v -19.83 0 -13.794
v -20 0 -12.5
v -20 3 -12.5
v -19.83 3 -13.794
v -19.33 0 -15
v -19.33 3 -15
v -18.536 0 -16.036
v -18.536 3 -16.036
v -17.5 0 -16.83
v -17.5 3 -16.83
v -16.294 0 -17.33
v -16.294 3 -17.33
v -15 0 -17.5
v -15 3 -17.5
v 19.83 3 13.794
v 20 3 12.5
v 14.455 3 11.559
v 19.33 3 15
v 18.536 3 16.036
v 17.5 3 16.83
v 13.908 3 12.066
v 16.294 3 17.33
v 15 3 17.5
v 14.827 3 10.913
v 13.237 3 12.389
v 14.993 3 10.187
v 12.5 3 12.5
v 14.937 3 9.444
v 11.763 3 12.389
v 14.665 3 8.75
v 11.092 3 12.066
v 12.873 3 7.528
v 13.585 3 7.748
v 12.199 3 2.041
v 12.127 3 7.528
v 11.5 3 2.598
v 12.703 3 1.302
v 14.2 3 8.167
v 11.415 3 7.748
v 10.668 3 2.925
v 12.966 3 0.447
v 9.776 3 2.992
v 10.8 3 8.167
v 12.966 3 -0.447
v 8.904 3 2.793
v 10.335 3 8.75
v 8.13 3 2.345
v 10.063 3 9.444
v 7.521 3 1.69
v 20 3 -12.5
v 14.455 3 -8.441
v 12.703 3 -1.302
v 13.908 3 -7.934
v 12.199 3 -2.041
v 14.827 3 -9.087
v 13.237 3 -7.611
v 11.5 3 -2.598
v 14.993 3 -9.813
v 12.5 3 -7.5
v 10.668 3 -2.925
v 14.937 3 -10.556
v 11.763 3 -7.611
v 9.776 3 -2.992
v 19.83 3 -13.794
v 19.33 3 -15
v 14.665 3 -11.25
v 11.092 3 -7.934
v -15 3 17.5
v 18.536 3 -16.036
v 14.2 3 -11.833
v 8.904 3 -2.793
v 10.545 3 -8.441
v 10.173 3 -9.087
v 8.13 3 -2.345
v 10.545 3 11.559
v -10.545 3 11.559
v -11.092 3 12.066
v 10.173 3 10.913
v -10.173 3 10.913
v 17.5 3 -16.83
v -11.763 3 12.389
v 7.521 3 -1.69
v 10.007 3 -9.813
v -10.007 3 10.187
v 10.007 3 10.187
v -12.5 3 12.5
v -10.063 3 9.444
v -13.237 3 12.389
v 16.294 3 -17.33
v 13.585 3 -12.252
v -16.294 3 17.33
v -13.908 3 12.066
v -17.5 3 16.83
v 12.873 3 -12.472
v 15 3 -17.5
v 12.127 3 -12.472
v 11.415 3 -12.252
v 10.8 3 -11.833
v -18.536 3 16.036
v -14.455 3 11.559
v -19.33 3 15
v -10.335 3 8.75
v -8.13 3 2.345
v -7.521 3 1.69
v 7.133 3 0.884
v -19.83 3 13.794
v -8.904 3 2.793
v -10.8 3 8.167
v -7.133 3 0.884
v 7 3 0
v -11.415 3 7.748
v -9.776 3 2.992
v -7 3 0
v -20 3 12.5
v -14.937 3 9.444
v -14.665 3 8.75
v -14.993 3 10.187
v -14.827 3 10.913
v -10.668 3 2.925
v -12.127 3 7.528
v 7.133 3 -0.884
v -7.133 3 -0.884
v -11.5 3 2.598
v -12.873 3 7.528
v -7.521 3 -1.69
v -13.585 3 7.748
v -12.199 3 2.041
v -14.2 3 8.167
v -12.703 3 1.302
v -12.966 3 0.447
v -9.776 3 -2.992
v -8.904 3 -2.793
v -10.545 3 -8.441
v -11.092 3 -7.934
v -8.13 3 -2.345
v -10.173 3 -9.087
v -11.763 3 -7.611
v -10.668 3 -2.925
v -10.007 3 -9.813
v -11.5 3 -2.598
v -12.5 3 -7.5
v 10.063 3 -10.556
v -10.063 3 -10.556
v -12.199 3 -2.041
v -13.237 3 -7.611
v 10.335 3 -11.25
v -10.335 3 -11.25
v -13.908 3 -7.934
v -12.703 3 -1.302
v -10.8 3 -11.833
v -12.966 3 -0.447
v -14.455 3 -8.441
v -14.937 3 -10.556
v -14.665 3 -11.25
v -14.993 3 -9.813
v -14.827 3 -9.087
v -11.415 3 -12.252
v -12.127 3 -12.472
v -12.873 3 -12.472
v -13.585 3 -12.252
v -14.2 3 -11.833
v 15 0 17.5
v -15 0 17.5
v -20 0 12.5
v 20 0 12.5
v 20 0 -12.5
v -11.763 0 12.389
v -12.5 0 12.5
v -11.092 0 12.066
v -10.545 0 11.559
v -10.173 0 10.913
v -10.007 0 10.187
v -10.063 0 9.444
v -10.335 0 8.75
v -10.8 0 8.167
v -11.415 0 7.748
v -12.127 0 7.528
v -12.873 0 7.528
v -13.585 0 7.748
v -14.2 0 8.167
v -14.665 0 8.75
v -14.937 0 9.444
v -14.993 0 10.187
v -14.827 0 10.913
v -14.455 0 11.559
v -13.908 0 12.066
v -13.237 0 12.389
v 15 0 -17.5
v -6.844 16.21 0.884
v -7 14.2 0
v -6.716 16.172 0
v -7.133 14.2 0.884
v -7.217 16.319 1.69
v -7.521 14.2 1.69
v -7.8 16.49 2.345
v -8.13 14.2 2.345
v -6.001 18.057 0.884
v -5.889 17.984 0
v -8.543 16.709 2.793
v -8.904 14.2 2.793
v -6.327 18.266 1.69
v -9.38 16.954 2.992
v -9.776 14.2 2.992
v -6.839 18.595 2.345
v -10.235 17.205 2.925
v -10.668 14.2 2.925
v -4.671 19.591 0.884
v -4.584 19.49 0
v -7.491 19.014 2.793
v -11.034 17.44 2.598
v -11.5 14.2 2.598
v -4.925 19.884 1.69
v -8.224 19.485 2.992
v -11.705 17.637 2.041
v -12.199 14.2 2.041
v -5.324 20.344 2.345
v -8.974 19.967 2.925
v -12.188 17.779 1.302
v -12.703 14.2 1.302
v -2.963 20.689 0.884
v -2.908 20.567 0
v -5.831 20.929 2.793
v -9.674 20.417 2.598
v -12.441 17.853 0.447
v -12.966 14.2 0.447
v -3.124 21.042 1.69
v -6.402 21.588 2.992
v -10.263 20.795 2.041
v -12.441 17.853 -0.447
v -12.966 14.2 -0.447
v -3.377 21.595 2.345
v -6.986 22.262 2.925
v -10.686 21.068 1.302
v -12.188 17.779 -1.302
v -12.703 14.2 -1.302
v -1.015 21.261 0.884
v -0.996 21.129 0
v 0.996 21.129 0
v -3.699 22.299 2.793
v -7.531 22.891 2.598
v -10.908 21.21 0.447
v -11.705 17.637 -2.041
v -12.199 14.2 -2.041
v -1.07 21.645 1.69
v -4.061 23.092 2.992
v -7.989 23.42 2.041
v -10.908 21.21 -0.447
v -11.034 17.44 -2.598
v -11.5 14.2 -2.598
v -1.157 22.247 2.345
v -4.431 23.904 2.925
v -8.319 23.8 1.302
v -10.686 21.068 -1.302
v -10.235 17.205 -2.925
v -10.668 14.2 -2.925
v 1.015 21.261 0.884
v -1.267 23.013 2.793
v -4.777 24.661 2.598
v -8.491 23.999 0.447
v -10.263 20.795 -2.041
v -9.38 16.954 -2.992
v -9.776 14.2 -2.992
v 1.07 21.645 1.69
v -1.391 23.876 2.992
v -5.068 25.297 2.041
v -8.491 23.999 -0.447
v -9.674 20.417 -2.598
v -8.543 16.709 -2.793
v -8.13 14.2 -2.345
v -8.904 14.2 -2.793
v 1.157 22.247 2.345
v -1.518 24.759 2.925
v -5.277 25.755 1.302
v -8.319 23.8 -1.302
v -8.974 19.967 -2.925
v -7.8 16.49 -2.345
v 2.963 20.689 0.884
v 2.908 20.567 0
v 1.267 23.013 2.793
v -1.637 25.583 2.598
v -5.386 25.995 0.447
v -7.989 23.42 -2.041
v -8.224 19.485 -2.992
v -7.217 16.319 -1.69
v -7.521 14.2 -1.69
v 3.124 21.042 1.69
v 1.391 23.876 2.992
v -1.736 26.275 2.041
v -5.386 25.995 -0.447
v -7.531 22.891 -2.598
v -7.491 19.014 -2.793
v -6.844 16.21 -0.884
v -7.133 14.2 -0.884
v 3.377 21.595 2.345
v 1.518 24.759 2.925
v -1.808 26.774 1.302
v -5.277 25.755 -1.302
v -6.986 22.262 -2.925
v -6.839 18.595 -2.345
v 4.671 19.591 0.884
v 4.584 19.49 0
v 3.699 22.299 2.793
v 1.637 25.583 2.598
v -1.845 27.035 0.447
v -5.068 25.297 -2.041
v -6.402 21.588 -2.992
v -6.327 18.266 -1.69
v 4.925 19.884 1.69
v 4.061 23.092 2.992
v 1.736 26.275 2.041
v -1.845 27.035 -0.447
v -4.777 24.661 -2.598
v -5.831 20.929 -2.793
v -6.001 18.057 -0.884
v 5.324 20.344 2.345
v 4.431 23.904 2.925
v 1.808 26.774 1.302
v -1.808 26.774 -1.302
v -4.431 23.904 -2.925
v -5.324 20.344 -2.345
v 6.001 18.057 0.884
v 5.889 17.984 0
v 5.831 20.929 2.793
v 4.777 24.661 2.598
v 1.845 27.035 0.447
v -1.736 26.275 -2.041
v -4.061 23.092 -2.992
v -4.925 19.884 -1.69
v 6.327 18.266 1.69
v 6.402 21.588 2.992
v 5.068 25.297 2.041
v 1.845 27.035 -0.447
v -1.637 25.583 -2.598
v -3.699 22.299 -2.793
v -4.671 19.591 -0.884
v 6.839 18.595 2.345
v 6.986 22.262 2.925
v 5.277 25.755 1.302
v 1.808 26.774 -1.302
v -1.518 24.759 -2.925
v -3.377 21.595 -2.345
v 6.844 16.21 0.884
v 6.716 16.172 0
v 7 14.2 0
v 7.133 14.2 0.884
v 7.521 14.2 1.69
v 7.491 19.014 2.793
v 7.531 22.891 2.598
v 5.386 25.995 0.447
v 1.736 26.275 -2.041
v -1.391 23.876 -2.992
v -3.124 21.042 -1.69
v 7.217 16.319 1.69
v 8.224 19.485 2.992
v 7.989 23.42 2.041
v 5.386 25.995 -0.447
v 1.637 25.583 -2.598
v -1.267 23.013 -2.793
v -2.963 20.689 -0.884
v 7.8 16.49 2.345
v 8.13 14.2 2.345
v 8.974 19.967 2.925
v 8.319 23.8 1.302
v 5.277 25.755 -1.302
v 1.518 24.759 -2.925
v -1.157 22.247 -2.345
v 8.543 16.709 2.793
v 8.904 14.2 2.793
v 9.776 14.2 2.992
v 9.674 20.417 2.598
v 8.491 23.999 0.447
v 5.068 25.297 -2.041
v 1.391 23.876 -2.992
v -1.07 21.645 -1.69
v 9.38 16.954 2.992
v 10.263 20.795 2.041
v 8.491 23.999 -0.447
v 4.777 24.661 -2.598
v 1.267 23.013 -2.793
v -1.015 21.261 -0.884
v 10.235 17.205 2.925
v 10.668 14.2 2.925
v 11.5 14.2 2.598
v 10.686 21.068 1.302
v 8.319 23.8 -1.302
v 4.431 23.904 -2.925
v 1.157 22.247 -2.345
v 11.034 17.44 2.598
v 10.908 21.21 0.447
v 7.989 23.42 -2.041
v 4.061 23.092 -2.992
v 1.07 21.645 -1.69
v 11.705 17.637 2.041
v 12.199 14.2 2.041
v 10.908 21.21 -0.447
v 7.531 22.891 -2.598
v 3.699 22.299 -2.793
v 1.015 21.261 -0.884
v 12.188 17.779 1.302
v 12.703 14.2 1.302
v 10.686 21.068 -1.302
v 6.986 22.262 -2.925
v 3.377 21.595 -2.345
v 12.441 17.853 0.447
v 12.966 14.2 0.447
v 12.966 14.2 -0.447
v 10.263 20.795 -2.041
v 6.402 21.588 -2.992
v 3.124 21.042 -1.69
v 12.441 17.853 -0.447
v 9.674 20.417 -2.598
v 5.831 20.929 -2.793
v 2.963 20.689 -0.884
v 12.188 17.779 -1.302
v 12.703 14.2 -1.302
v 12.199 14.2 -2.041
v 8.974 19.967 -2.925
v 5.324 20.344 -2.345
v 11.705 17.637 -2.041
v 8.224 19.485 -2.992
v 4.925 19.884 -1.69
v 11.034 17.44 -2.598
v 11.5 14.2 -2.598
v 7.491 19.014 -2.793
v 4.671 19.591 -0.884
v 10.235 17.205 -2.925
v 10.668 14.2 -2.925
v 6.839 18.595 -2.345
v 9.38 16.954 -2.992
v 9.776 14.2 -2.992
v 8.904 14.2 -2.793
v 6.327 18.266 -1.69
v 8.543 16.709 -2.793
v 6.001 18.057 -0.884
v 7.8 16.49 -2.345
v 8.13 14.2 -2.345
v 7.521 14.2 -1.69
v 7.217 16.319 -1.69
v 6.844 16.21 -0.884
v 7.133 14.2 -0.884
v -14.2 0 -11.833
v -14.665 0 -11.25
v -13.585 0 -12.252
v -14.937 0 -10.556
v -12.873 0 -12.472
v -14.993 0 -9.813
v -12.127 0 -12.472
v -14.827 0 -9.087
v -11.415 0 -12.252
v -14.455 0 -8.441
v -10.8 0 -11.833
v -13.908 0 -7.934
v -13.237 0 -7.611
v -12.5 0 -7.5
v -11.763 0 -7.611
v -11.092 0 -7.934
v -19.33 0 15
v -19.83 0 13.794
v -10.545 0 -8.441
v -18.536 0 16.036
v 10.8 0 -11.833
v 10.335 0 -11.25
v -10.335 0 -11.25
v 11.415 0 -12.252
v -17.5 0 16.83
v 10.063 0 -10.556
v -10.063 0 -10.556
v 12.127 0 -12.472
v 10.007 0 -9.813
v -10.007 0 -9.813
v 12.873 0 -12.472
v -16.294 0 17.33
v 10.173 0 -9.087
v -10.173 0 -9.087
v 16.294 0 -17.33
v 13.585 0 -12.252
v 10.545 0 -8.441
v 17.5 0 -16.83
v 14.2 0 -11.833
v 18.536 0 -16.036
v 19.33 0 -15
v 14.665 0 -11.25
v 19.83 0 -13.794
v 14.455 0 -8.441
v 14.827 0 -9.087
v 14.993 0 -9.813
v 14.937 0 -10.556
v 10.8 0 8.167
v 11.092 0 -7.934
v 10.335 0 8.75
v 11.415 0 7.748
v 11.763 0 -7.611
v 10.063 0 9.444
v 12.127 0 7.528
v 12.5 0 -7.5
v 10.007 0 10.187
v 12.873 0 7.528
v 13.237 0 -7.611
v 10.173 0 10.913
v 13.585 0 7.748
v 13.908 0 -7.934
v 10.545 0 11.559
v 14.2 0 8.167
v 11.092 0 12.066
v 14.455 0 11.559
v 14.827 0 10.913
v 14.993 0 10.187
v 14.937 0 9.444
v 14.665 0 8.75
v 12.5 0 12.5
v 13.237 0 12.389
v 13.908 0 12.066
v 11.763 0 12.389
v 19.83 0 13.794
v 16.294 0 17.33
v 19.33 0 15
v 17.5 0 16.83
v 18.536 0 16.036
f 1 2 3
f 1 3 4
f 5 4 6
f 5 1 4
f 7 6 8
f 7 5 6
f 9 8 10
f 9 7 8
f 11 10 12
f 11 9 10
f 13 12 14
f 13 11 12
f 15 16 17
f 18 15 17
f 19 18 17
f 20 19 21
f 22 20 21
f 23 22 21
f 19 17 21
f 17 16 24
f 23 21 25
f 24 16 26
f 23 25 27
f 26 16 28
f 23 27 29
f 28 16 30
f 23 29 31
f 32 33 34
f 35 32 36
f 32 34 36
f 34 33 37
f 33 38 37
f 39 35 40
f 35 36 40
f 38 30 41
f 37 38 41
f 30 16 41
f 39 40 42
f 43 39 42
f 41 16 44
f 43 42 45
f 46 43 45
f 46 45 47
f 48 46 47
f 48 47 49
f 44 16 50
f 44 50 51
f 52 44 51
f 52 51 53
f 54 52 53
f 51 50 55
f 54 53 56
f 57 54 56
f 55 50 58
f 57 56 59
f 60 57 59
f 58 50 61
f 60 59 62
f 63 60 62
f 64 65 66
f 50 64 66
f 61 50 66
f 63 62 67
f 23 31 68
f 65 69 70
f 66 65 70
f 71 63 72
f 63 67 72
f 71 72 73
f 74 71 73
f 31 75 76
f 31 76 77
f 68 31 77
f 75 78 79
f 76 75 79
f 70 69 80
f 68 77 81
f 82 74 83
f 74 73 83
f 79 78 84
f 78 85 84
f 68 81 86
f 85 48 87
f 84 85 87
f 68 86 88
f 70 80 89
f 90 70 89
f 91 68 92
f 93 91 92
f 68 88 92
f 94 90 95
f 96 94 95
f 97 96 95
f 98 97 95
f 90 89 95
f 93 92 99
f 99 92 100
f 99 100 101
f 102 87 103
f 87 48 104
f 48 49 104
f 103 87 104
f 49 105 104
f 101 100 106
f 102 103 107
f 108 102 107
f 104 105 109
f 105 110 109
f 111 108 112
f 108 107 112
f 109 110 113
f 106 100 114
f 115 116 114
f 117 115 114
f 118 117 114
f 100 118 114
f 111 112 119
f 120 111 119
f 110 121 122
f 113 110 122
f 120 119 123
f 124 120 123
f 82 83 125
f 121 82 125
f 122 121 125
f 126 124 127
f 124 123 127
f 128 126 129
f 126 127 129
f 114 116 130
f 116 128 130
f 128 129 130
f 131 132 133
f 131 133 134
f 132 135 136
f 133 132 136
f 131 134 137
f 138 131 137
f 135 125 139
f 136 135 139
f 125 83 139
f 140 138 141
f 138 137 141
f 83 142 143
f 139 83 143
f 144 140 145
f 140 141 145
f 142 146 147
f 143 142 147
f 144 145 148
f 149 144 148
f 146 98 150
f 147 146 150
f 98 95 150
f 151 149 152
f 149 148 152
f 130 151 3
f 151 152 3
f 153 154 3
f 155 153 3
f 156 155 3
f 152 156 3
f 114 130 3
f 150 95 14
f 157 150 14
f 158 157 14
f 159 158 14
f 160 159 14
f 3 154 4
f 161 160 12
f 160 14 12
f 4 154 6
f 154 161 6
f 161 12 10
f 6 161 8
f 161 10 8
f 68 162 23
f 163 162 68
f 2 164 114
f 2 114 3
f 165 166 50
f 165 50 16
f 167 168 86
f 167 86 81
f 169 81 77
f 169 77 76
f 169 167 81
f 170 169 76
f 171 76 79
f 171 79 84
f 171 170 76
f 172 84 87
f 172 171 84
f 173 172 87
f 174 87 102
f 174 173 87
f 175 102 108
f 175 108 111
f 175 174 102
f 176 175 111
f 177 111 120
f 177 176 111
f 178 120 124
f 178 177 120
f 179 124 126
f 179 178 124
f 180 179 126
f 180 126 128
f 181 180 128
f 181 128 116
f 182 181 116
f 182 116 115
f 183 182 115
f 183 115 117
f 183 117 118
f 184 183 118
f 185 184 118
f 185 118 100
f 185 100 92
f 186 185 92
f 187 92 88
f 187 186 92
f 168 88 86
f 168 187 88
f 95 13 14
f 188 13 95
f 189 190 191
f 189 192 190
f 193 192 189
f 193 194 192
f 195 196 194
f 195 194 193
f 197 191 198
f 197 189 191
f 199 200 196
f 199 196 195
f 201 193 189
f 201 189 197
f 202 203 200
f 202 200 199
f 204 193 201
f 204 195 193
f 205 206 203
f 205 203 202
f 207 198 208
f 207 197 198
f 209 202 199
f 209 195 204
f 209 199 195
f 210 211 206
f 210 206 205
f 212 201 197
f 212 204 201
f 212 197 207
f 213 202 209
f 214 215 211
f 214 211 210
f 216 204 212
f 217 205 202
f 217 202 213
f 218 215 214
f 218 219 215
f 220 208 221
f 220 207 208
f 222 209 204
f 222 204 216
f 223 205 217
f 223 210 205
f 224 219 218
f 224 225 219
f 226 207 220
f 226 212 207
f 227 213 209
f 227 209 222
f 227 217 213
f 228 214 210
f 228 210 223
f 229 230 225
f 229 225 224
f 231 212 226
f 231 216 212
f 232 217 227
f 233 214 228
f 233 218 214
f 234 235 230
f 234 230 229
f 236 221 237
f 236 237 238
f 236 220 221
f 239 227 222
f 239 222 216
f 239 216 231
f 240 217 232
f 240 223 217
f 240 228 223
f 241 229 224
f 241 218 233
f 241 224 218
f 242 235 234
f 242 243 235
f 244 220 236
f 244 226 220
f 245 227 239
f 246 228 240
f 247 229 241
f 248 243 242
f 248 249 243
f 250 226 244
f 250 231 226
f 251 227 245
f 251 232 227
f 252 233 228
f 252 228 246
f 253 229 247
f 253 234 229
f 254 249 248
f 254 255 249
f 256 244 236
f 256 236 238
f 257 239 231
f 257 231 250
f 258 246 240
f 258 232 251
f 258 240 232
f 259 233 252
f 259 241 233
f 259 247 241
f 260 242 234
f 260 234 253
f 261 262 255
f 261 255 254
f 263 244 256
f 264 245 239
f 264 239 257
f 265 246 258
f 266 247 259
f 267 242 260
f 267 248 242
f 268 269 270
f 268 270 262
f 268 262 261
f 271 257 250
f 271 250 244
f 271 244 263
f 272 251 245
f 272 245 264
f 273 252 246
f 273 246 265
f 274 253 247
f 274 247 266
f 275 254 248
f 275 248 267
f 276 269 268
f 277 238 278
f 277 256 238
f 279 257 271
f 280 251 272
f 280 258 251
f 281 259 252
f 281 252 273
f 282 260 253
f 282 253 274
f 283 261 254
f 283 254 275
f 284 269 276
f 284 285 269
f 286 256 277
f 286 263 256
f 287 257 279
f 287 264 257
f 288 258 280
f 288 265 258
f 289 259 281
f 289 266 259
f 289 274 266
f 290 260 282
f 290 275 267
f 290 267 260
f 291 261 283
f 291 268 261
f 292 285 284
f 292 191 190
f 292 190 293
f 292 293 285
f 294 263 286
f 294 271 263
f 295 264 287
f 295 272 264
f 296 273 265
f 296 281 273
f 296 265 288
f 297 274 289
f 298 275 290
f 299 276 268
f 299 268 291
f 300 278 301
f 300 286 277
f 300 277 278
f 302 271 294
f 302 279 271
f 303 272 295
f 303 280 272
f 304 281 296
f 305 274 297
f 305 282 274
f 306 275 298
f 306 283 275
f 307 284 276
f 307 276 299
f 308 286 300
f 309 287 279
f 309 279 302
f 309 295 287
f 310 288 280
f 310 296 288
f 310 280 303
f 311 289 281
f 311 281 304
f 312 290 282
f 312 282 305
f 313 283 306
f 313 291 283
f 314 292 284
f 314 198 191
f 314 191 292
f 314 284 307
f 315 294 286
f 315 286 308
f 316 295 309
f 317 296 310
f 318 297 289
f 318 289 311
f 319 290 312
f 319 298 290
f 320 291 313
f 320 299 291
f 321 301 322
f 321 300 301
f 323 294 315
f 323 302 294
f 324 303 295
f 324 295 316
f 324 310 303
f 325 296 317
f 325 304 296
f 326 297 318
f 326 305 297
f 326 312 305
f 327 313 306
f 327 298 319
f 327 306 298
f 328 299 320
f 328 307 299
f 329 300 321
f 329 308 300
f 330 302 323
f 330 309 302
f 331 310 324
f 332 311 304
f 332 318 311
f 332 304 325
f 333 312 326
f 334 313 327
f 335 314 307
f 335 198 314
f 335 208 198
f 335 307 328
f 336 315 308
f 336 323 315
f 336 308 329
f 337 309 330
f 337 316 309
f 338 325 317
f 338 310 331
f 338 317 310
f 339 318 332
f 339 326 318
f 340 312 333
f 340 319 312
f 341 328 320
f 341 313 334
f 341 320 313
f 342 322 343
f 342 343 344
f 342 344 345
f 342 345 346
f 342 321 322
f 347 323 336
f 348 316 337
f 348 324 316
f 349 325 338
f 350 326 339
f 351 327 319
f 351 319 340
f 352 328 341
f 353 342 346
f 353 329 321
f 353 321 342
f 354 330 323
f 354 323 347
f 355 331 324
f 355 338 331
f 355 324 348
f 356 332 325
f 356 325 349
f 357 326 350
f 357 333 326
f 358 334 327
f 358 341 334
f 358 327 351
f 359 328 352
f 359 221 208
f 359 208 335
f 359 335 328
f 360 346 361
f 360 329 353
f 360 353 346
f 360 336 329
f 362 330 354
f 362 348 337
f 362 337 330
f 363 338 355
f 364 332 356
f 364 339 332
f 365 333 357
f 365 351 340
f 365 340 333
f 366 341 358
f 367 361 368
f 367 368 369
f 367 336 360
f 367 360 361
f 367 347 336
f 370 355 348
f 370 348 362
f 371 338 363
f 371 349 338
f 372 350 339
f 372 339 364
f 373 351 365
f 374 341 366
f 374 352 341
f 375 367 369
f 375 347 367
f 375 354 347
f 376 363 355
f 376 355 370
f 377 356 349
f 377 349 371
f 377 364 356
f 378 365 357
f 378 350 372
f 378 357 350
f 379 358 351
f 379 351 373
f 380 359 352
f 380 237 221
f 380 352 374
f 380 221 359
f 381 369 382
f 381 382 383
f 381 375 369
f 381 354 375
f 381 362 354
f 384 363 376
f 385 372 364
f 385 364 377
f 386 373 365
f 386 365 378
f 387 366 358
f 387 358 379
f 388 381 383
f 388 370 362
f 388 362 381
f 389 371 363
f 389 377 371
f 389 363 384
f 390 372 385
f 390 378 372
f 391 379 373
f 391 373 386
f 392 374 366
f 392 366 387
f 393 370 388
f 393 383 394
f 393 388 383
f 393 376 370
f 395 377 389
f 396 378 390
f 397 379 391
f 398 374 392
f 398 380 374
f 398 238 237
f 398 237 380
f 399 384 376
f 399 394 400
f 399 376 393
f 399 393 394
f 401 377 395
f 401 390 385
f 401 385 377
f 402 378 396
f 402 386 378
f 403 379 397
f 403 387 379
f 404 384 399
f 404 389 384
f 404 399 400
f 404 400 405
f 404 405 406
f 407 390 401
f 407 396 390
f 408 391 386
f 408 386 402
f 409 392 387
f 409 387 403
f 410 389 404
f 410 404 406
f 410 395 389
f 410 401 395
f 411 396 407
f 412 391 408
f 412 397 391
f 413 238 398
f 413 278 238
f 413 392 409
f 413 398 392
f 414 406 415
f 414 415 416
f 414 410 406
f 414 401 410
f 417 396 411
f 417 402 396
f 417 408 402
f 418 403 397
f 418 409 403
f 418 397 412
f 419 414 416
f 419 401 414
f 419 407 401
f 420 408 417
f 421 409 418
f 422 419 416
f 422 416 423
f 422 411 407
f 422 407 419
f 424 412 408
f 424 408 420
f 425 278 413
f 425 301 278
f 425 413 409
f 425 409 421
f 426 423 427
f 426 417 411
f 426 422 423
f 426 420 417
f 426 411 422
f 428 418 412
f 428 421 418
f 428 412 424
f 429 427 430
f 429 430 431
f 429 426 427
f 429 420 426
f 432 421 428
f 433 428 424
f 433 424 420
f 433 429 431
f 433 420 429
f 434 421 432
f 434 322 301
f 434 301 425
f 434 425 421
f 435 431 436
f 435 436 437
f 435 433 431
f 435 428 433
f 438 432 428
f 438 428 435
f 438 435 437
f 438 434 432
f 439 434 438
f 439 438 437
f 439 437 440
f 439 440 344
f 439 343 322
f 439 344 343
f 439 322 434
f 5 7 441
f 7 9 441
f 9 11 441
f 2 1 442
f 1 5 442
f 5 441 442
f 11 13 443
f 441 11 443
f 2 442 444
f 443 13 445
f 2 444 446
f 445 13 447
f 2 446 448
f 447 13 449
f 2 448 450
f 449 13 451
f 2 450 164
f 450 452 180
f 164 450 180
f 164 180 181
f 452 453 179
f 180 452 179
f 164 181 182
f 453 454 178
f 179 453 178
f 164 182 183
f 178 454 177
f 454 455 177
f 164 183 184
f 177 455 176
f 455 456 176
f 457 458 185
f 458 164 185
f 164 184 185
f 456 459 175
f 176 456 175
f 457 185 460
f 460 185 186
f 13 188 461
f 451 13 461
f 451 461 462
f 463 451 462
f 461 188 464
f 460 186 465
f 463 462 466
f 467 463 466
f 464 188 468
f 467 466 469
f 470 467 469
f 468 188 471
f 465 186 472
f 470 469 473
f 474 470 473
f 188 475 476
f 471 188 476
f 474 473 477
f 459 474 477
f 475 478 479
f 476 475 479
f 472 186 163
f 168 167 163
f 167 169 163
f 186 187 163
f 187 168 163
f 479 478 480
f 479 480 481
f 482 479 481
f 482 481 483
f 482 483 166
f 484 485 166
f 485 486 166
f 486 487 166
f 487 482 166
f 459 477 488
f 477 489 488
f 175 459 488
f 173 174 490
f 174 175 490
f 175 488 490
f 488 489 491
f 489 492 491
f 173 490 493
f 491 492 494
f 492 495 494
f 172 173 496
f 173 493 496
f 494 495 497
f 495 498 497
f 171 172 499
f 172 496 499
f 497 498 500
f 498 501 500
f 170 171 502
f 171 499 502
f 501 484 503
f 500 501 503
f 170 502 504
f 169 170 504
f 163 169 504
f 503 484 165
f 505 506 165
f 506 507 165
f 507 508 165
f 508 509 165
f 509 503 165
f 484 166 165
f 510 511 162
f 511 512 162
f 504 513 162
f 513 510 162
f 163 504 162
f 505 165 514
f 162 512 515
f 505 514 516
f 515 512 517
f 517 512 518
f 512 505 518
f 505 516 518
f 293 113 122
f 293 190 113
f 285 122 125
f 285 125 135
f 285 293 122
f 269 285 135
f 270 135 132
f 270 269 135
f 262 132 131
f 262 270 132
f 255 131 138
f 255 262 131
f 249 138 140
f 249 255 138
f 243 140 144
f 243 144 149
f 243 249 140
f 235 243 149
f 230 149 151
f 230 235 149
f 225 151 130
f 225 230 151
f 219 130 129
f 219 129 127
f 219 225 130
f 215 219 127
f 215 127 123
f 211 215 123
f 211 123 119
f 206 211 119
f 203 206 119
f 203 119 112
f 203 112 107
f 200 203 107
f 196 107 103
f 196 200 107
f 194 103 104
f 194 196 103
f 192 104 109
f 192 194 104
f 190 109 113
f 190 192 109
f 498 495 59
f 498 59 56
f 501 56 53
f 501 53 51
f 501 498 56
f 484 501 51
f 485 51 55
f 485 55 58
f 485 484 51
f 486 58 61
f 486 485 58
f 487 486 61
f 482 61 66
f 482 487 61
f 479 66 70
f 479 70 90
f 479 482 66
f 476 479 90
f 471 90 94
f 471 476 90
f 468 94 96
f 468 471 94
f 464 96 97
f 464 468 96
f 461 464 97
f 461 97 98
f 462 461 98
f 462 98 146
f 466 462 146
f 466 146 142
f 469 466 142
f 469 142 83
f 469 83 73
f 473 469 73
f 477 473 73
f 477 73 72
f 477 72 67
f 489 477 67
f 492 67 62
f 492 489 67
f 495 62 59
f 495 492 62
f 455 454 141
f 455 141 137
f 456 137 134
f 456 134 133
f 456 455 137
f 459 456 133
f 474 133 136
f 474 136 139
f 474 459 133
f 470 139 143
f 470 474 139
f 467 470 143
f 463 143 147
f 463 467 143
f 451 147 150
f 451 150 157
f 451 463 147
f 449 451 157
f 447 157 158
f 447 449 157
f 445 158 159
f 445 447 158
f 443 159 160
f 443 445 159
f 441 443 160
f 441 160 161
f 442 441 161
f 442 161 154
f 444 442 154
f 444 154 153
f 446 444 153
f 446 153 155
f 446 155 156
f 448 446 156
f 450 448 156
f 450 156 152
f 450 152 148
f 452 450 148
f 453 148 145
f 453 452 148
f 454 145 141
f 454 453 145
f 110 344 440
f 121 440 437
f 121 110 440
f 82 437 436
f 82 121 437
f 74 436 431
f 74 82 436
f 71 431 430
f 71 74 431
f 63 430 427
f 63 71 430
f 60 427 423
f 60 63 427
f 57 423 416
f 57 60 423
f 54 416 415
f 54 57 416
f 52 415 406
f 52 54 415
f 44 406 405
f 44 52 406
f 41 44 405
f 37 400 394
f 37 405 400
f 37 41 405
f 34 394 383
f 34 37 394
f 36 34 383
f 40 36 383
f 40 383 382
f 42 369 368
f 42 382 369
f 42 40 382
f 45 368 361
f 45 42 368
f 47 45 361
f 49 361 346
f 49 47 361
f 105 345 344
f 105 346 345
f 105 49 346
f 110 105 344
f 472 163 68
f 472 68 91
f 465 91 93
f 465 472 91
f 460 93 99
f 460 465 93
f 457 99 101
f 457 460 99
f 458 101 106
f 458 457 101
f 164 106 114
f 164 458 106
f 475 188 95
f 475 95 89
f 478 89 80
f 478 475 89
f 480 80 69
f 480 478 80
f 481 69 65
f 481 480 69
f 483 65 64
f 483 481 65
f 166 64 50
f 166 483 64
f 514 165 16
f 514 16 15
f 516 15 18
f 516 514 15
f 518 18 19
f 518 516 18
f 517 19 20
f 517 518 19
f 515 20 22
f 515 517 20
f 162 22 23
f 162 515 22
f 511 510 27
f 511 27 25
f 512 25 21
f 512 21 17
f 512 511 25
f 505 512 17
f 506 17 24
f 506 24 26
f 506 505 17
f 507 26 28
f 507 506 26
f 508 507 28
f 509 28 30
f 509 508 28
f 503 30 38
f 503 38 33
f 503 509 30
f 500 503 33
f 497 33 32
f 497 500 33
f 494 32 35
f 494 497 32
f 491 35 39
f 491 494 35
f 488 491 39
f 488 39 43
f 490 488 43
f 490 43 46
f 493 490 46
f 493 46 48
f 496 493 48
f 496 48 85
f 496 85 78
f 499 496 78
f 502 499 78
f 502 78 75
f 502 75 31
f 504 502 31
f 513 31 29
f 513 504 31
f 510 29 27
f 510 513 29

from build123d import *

# Parameters (mm, degrees)
SKETCH1_R           = 2.5
BOSS_EXTRUDE1_DEPTH = 3
SKETCH2_R           = 3


with BuildPart() as part:
    # Sketch1 → Boss-Extrude1 (new body)
    with BuildSketch(Plane(origin=(0, 0, 0), x_dir=(1, 0, 0), z_dir=(0, 1, 0))):
        with BuildLine():
            Line((15, -17.5), (-15, -17.5))
            ThreePointArc((-15, -17.5), (-18.535533906, -16.035533906), (-20, -12.5))
            Line((-20, -12.5), (-20, 12.5))
            ThreePointArc((-20, 12.5), (-18.535533906, 16.035533906), (-15, 17.5))
            Line((-15, 17.5), (15, 17.5))
            ThreePointArc((15, 17.5), (18.535533906, 16.035533906), (20, 12.5))
            Line((20, 12.5), (20, -12.5))
            ThreePointArc((20, -12.5), (18.535533906, -16.035533906), (15, -17.5))
        make_face()
        with Locations(Location((-12.5, 10, 0), (0, 0, 270))):
            Circle(SKETCH1_R, mode=Mode.SUBTRACT)
        with Locations(Location((12.5, 10, 0), (0, 0, 270))):
            Circle(SKETCH1_R, mode=Mode.SUBTRACT)
        with Locations(Location((-12.5, -10, 0), (0, 0, 270))):
            Circle(SKETCH1_R, mode=Mode.SUBTRACT)
        with Locations(Location((12.5, -10, 0), (0, 0, 270))):
            Circle(SKETCH1_R, mode=Mode.SUBTRACT)
    extrude(amount=BOSS_EXTRUDE1_DEPTH)

    # Sweep1: sweep along a path in Sketch3
    with BuildLine(Plane.XY) as sweep1_path:
        Line((-10, 0), (-10, 14.2))
        ThreePointArc((-10, 14.2), (0, 24.2), (10, 14.2))
        Line((10, 14.2), (10, 0))
    # Sketch2 → Sweep1 (sweep)
    with BuildSketch(Plane(origin=(0, 0, 0), x_dir=(1, 0, 0), z_dir=(0, 1, 0))):
        with Locations((-10, 0)):
            Circle(SKETCH2_R)
    sweep(path=sweep1_path.line)


solid = part.part
